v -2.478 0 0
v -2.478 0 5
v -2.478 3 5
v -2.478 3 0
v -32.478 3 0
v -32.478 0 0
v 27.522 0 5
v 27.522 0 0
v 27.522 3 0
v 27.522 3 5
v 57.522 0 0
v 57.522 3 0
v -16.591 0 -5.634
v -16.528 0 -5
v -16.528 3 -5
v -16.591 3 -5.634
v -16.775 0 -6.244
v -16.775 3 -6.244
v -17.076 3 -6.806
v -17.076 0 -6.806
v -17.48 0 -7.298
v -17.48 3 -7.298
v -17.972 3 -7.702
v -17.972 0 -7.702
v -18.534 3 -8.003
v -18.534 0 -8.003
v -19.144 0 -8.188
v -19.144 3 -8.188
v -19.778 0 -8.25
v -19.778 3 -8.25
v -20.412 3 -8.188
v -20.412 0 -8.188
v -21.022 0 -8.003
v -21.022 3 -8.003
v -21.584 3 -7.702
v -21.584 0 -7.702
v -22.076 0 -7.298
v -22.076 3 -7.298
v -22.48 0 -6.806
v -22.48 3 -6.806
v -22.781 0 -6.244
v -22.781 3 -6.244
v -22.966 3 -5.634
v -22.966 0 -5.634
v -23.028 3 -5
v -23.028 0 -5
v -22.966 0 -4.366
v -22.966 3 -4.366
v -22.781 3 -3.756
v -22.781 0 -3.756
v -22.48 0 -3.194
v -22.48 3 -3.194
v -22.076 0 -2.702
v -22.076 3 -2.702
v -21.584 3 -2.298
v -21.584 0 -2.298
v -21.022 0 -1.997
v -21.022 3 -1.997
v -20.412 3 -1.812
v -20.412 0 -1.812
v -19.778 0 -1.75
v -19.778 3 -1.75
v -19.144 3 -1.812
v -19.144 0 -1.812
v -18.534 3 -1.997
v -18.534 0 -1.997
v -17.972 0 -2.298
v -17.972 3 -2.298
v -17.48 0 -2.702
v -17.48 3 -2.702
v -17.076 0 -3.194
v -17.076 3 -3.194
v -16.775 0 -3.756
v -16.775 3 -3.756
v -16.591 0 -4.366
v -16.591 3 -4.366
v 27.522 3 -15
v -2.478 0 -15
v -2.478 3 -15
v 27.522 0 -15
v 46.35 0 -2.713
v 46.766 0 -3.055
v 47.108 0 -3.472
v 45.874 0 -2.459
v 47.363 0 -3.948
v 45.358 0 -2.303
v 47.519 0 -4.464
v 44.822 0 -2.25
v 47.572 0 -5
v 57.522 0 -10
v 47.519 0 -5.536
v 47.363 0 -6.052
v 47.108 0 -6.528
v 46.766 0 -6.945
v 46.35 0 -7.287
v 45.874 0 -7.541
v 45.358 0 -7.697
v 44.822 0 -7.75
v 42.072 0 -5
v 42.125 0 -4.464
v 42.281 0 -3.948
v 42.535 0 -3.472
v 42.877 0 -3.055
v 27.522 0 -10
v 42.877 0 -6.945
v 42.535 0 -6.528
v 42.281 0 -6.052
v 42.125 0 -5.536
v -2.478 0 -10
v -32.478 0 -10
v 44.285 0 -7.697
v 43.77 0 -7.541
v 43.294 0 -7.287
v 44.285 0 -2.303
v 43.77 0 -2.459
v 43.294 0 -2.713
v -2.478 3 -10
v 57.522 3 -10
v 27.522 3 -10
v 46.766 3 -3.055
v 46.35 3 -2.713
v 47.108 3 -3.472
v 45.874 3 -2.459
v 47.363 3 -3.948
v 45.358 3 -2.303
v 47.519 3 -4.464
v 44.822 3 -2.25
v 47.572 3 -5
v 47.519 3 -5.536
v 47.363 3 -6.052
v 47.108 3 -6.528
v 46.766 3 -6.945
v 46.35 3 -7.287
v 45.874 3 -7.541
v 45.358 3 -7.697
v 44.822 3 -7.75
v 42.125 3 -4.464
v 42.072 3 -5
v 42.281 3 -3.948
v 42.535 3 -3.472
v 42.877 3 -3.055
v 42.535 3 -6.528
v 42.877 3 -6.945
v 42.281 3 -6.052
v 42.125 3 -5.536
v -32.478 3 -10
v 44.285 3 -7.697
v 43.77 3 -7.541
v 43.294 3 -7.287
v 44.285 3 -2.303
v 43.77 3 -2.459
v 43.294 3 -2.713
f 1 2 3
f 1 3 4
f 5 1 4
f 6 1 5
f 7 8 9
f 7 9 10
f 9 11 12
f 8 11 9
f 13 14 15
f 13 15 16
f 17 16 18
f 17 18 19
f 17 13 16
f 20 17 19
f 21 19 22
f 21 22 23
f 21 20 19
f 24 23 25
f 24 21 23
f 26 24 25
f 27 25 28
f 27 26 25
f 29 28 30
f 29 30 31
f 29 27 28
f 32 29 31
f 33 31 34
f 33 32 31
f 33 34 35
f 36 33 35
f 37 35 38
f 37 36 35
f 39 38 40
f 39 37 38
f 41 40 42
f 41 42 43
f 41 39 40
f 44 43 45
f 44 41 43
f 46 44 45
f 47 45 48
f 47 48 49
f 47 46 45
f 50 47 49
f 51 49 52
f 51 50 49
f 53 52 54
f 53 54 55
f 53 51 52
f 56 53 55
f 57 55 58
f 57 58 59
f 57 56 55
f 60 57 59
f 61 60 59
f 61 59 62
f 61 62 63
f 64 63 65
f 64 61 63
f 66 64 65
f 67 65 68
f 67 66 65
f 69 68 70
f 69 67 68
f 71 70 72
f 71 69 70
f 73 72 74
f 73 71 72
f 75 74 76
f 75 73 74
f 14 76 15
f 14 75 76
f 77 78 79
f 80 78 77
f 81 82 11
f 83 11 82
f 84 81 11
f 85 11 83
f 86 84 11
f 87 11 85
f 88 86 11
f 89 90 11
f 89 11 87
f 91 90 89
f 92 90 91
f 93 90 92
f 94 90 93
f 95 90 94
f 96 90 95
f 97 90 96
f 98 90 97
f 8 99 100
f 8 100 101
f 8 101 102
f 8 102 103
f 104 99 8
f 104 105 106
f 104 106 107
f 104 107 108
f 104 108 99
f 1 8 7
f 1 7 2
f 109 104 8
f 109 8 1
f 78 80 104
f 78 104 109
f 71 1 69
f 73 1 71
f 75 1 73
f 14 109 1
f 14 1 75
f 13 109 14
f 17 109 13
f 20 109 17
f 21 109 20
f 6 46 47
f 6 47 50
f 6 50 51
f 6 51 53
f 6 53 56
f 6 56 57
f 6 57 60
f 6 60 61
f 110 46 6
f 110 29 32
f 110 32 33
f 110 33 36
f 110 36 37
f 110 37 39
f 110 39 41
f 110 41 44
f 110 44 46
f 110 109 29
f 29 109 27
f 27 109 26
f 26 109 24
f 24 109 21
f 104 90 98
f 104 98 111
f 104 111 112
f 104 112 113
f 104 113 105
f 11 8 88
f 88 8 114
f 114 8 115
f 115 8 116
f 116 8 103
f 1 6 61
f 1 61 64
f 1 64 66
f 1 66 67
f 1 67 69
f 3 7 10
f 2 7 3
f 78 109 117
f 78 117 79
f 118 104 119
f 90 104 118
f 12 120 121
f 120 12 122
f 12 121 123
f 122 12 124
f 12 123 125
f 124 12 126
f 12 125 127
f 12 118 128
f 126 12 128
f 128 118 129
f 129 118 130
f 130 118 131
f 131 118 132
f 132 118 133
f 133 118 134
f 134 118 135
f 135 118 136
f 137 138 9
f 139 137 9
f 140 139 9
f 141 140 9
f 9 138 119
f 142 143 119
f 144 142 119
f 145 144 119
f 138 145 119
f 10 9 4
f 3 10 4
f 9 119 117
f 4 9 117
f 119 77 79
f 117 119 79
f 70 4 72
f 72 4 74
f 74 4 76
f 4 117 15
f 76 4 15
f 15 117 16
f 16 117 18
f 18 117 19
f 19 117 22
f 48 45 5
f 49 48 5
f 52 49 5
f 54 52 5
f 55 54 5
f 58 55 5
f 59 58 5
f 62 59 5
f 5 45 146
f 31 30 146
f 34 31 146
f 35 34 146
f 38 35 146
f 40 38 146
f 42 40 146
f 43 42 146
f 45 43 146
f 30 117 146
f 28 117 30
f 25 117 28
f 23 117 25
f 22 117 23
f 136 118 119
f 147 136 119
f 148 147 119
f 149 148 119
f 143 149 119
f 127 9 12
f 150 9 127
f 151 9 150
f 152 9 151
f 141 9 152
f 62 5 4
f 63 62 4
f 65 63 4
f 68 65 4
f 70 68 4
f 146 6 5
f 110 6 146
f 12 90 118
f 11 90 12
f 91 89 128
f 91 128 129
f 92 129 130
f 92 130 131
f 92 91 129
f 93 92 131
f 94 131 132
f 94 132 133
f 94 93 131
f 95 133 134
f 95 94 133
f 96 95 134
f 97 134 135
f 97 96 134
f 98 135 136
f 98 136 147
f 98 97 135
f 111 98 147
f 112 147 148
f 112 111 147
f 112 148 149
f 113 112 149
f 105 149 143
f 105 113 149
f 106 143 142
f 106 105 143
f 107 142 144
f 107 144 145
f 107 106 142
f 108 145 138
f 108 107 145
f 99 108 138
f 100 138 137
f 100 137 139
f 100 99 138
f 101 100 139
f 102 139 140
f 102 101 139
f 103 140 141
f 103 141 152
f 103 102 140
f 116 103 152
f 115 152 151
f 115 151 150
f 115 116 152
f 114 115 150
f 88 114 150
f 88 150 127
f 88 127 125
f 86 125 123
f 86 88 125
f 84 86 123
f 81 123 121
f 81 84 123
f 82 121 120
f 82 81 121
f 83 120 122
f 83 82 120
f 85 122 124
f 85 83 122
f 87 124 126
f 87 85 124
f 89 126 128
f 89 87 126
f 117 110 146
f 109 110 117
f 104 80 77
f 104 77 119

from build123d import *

# Parameters (mm, degrees)
SKETCH1_R           = 3.25
SKETCH1_R_2         = 2.75
BOSS_EXTRUDE1_DEPTH = 3


with BuildPart() as part:
    # Sketch1 → Boss-Extrude1 (new body)
    with BuildSketch(Plane(origin=(0, 0, 0), x_dir=(1, 0, 0), z_dir=(0, 1, 0))):
        Polygon((-32.478065847, 0), (-32.478065847, 10), (-2.478065847, 10), (-2.478065847, 15), (27.521934153, 15), (27.521934153, 10), (57.521934153, 10), (57.521934153, 0), (27.521934153, 0), (27.521934153, -5), (-2.478065847, -5), (-2.478065847, 0), align=None)
        with Locations((-19.778065847, 5)):
            Circle(SKETCH1_R, mode=Mode.SUBTRACT)
        with Locations((44.821934153, 5)):
            Circle(SKETCH1_R_2, mode=Mode.SUBTRACT)
    extrude(amount=BOSS_EXTRUDE1_DEPTH)


solid = part.part
